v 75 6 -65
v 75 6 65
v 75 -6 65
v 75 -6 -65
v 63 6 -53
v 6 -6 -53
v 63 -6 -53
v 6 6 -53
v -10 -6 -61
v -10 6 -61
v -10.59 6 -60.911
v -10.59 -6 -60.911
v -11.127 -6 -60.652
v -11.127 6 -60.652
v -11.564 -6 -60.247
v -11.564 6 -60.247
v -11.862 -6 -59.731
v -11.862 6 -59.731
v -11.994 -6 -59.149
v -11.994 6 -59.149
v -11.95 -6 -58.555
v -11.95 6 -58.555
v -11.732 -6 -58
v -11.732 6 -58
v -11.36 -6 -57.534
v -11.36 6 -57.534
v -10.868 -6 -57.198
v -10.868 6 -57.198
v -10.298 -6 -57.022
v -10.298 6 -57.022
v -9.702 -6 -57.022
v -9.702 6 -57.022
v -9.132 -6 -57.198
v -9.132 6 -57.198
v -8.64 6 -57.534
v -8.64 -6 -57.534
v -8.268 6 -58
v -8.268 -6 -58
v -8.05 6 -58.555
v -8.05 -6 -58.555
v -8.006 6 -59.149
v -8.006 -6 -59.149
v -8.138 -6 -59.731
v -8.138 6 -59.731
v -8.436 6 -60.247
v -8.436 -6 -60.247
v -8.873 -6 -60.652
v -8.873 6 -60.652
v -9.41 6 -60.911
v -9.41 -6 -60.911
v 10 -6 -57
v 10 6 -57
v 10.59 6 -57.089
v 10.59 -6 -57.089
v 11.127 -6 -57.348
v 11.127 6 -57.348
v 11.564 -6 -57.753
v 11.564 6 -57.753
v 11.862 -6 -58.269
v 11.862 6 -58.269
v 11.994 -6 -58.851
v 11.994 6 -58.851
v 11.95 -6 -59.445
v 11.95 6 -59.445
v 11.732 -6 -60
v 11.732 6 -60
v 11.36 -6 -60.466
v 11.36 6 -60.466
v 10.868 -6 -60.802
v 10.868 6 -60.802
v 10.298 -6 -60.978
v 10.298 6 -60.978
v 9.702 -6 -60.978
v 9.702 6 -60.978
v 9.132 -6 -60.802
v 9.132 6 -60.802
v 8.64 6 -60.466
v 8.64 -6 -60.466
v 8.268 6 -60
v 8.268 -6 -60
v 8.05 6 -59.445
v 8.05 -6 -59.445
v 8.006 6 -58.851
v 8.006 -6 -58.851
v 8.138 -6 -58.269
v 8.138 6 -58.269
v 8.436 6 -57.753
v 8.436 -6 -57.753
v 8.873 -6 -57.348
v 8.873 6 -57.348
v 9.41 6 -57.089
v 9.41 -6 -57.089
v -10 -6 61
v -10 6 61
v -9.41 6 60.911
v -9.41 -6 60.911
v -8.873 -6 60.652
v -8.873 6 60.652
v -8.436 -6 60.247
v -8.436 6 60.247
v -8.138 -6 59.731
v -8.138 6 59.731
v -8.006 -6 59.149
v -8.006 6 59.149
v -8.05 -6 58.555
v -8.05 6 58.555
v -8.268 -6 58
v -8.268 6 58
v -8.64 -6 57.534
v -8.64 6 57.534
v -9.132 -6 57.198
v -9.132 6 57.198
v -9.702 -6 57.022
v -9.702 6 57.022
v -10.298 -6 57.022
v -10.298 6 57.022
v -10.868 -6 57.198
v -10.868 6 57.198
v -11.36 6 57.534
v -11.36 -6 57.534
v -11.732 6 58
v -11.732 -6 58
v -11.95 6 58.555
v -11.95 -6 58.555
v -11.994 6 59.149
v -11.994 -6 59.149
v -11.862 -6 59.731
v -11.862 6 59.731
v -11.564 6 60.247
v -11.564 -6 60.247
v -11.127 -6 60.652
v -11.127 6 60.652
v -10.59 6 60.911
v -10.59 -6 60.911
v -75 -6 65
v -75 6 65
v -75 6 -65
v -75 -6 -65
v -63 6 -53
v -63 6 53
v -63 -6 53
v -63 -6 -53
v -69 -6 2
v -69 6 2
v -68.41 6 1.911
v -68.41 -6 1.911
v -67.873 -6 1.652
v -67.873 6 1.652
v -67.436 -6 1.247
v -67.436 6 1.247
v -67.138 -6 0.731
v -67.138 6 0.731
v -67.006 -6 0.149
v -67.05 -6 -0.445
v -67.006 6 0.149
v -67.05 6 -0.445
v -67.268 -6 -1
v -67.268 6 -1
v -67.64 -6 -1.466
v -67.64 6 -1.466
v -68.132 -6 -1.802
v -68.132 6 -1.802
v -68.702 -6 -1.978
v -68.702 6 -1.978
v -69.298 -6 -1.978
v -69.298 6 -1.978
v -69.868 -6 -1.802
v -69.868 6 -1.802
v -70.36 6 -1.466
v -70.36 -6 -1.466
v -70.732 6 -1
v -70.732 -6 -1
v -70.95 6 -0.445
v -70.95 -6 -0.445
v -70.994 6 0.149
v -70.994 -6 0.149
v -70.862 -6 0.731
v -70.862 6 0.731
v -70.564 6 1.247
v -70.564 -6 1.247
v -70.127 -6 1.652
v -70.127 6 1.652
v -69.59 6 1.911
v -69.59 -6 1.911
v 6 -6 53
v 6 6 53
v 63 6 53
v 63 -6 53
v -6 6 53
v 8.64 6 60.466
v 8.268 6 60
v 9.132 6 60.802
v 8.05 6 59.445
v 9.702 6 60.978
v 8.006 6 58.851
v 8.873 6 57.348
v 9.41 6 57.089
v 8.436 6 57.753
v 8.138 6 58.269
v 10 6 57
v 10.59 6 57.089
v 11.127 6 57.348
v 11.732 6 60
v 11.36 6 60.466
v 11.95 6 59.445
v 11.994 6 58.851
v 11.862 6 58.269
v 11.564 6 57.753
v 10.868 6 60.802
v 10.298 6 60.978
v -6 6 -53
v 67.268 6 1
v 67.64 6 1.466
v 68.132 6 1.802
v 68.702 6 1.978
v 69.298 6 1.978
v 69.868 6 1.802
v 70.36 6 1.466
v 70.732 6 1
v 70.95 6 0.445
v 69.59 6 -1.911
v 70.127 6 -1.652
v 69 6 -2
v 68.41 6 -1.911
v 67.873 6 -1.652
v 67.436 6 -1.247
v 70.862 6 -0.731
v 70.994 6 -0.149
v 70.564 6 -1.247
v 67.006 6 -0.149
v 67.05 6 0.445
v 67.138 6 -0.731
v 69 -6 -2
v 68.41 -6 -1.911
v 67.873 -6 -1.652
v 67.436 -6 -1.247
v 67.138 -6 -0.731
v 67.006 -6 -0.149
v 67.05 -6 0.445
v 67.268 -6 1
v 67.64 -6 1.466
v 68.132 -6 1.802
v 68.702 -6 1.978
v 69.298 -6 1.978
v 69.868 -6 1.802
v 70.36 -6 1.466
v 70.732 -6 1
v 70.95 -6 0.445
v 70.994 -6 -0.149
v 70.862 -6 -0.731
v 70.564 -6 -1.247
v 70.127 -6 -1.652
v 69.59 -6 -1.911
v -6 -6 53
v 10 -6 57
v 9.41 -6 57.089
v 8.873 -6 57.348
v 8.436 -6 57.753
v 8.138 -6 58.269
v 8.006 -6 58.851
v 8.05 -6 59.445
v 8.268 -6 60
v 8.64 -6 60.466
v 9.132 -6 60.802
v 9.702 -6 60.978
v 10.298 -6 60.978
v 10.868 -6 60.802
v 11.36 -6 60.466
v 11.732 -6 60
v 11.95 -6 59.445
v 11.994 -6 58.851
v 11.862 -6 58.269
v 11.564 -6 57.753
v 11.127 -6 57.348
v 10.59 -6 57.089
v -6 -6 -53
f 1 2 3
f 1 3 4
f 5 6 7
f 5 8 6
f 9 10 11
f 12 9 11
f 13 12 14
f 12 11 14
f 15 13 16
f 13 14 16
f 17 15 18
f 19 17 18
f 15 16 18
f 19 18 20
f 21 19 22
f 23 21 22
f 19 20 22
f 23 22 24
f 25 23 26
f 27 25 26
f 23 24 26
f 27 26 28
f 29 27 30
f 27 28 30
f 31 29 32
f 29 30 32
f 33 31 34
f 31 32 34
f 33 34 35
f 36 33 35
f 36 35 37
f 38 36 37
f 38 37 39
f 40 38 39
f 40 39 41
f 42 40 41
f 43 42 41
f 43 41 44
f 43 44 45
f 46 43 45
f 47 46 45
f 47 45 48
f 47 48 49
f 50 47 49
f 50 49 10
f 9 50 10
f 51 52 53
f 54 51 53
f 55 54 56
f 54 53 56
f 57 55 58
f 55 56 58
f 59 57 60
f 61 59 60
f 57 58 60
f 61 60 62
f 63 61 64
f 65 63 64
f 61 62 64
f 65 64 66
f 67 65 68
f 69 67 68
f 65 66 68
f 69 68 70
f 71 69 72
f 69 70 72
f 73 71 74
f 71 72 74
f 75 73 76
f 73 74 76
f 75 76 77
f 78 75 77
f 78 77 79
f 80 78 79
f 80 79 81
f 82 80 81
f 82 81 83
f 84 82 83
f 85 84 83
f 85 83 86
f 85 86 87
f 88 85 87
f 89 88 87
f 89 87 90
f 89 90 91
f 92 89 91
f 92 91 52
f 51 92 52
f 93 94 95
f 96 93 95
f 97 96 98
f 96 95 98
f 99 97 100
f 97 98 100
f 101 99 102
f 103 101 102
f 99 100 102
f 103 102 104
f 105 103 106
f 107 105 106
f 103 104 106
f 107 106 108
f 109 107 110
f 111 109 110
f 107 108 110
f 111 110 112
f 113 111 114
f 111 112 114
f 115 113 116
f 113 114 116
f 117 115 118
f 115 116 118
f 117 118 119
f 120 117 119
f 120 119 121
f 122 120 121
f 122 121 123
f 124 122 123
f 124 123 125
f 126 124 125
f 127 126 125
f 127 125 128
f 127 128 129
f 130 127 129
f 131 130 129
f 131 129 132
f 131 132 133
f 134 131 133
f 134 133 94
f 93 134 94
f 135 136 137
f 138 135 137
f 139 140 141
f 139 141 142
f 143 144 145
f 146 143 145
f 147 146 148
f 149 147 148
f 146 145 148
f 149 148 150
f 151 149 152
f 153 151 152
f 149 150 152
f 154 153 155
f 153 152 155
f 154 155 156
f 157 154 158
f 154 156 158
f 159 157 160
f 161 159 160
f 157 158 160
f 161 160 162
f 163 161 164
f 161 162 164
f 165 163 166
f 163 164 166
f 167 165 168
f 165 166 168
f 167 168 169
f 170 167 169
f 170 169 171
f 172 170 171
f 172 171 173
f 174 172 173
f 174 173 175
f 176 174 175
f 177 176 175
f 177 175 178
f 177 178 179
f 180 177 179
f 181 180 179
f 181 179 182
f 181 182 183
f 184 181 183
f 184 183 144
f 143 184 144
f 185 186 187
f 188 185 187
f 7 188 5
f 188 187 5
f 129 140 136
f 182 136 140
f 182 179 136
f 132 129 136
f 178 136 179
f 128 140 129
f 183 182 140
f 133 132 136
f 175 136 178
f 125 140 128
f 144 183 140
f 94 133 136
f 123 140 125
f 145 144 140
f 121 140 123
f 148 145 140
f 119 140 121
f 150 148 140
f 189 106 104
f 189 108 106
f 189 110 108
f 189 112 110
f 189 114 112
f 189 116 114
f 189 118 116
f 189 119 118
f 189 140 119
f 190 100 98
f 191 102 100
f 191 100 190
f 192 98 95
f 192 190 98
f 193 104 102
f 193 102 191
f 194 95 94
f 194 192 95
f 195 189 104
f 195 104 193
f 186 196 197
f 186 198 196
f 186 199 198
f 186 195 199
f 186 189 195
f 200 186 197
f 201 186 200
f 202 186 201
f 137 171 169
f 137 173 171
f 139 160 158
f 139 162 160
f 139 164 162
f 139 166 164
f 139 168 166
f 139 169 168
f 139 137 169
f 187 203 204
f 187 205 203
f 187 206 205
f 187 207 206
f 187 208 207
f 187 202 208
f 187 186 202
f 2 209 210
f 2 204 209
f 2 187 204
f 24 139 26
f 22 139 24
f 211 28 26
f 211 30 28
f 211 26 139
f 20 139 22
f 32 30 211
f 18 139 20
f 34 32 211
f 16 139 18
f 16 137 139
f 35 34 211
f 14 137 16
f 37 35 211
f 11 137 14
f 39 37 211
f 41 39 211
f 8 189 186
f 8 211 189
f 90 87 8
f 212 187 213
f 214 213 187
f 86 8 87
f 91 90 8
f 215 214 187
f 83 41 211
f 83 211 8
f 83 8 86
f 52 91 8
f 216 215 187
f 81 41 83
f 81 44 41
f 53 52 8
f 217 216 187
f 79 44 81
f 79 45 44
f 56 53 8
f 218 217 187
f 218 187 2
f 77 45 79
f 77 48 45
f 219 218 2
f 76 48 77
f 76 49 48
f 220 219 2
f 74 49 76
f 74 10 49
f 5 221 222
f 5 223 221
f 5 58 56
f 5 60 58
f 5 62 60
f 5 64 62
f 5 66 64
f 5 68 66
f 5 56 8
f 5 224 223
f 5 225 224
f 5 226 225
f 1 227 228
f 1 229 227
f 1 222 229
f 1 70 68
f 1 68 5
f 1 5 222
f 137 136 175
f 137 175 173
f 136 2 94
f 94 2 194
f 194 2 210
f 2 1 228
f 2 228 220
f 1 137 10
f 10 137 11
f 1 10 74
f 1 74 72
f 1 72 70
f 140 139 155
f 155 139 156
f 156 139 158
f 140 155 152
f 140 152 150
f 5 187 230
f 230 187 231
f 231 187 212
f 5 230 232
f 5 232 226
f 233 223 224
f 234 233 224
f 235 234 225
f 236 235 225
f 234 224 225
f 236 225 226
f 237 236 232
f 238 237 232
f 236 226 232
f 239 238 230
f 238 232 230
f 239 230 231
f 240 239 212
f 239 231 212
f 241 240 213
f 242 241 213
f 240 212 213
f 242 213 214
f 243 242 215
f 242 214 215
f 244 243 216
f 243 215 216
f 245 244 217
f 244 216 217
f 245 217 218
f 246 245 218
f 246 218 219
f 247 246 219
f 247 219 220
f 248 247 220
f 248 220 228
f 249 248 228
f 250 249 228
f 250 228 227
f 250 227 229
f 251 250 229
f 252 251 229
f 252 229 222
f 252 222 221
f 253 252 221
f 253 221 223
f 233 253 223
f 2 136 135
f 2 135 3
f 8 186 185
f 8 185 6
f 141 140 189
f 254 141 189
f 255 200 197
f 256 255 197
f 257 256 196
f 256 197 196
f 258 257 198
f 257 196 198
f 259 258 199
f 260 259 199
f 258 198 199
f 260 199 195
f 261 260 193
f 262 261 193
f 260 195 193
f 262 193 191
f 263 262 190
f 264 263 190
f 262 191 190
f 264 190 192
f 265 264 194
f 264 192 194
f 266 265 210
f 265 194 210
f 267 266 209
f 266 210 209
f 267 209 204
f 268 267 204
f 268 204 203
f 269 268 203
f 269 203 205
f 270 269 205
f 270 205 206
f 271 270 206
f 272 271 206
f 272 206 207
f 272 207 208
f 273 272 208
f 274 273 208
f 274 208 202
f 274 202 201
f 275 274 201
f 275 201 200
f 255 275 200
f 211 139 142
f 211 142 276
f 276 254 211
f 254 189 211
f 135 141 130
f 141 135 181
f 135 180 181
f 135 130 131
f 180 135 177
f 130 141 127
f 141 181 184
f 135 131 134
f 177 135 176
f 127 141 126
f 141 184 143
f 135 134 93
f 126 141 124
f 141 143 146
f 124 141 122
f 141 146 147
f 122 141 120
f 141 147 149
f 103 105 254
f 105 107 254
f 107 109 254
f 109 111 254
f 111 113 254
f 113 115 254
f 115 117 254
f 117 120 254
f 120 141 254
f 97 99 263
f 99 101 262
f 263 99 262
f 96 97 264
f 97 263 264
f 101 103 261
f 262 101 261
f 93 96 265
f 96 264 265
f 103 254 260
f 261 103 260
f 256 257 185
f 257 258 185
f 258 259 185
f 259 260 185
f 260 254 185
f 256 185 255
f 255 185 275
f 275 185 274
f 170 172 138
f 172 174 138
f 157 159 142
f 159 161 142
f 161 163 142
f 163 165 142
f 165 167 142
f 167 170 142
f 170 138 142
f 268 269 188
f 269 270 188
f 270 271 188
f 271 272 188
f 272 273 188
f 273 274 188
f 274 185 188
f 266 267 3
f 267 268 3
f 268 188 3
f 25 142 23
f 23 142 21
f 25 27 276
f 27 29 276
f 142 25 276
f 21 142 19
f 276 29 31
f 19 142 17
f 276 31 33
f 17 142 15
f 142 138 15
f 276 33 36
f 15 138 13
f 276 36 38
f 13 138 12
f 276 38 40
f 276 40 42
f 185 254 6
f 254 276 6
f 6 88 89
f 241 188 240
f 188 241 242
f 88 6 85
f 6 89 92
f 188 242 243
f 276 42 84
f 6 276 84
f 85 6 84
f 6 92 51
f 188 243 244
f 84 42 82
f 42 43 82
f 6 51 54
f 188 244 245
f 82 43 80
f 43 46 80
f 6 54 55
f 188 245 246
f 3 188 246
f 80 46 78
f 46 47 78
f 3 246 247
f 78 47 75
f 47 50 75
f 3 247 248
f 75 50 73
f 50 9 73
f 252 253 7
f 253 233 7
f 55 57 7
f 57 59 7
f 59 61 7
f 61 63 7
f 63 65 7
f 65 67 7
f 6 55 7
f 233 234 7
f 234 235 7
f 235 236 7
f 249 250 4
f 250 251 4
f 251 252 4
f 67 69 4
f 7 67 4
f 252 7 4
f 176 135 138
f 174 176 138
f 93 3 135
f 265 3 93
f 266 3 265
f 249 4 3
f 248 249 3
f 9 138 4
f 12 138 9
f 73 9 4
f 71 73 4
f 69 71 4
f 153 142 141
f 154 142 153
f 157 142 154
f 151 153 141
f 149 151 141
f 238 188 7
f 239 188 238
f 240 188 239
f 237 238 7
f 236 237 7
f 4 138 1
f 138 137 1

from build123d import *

# Parameters (mm, degrees)
SKETCH1_W           = 150
SKETCH1_H           = 130
SKETCH1_W_2         = 57
SKETCH1_H_2         = 106
BOSS_EXTRUDE1_DEPTH = 6
SKETCH2_R           = 2
CUT_EXTRUDE1_DEPTH  = 100.969995499


with BuildPart() as part:
    # Sketch1 → Boss-Extrude1 (new, symmetric)
    with BuildSketch(Plane(origin=(0, 0, 0), x_dir=(1, 0, 0), z_dir=(0, 1, 0))):
        Rectangle(SKETCH1_W, SKETCH1_H)
        with Locations((-34.5, 0)):
            Rectangle(SKETCH1_W_2, SKETCH1_H_2, mode=Mode.SUBTRACT)
        with Locations((34.5, 0)):
            Rectangle(SKETCH1_W_2, SKETCH1_H_2, mode=Mode.SUBTRACT)
    extrude(amount=BOSS_EXTRUDE1_DEPTH, both=True)

    # Sketch2 → Cut-Extrude1 (cut, through all)
    with BuildSketch(Plane(origin=(0, 6, 0), x_dir=(1, 0, 0), z_dir=(0, 1, 0))):
        with Locations(Location((-69, 0, 0), (0, 0, 270))):
            Circle(SKETCH2_R)
        with Locations(Location((69, 0, 0), (0, 0, 90))):
            Circle(SKETCH2_R)
        with Locations(Location((-10, -59, 0), (0, 0, 270))):
            Circle(SKETCH2_R)
        with Locations(Location((10, -59, 0), (0, 0, 90))):
            Circle(SKETCH2_R)
        with Locations(Location((-10, 59, 0), (0, 0, 90))):
            Circle(SKETCH2_R)
        with Locations(Location((10, 59, 0), (0, 0, 270))):
            Circle(SKETCH2_R)
    extrude(amount=-CUT_EXTRUDE1_DEPTH, mode=Mode.SUBTRACT)


solid = part.part
